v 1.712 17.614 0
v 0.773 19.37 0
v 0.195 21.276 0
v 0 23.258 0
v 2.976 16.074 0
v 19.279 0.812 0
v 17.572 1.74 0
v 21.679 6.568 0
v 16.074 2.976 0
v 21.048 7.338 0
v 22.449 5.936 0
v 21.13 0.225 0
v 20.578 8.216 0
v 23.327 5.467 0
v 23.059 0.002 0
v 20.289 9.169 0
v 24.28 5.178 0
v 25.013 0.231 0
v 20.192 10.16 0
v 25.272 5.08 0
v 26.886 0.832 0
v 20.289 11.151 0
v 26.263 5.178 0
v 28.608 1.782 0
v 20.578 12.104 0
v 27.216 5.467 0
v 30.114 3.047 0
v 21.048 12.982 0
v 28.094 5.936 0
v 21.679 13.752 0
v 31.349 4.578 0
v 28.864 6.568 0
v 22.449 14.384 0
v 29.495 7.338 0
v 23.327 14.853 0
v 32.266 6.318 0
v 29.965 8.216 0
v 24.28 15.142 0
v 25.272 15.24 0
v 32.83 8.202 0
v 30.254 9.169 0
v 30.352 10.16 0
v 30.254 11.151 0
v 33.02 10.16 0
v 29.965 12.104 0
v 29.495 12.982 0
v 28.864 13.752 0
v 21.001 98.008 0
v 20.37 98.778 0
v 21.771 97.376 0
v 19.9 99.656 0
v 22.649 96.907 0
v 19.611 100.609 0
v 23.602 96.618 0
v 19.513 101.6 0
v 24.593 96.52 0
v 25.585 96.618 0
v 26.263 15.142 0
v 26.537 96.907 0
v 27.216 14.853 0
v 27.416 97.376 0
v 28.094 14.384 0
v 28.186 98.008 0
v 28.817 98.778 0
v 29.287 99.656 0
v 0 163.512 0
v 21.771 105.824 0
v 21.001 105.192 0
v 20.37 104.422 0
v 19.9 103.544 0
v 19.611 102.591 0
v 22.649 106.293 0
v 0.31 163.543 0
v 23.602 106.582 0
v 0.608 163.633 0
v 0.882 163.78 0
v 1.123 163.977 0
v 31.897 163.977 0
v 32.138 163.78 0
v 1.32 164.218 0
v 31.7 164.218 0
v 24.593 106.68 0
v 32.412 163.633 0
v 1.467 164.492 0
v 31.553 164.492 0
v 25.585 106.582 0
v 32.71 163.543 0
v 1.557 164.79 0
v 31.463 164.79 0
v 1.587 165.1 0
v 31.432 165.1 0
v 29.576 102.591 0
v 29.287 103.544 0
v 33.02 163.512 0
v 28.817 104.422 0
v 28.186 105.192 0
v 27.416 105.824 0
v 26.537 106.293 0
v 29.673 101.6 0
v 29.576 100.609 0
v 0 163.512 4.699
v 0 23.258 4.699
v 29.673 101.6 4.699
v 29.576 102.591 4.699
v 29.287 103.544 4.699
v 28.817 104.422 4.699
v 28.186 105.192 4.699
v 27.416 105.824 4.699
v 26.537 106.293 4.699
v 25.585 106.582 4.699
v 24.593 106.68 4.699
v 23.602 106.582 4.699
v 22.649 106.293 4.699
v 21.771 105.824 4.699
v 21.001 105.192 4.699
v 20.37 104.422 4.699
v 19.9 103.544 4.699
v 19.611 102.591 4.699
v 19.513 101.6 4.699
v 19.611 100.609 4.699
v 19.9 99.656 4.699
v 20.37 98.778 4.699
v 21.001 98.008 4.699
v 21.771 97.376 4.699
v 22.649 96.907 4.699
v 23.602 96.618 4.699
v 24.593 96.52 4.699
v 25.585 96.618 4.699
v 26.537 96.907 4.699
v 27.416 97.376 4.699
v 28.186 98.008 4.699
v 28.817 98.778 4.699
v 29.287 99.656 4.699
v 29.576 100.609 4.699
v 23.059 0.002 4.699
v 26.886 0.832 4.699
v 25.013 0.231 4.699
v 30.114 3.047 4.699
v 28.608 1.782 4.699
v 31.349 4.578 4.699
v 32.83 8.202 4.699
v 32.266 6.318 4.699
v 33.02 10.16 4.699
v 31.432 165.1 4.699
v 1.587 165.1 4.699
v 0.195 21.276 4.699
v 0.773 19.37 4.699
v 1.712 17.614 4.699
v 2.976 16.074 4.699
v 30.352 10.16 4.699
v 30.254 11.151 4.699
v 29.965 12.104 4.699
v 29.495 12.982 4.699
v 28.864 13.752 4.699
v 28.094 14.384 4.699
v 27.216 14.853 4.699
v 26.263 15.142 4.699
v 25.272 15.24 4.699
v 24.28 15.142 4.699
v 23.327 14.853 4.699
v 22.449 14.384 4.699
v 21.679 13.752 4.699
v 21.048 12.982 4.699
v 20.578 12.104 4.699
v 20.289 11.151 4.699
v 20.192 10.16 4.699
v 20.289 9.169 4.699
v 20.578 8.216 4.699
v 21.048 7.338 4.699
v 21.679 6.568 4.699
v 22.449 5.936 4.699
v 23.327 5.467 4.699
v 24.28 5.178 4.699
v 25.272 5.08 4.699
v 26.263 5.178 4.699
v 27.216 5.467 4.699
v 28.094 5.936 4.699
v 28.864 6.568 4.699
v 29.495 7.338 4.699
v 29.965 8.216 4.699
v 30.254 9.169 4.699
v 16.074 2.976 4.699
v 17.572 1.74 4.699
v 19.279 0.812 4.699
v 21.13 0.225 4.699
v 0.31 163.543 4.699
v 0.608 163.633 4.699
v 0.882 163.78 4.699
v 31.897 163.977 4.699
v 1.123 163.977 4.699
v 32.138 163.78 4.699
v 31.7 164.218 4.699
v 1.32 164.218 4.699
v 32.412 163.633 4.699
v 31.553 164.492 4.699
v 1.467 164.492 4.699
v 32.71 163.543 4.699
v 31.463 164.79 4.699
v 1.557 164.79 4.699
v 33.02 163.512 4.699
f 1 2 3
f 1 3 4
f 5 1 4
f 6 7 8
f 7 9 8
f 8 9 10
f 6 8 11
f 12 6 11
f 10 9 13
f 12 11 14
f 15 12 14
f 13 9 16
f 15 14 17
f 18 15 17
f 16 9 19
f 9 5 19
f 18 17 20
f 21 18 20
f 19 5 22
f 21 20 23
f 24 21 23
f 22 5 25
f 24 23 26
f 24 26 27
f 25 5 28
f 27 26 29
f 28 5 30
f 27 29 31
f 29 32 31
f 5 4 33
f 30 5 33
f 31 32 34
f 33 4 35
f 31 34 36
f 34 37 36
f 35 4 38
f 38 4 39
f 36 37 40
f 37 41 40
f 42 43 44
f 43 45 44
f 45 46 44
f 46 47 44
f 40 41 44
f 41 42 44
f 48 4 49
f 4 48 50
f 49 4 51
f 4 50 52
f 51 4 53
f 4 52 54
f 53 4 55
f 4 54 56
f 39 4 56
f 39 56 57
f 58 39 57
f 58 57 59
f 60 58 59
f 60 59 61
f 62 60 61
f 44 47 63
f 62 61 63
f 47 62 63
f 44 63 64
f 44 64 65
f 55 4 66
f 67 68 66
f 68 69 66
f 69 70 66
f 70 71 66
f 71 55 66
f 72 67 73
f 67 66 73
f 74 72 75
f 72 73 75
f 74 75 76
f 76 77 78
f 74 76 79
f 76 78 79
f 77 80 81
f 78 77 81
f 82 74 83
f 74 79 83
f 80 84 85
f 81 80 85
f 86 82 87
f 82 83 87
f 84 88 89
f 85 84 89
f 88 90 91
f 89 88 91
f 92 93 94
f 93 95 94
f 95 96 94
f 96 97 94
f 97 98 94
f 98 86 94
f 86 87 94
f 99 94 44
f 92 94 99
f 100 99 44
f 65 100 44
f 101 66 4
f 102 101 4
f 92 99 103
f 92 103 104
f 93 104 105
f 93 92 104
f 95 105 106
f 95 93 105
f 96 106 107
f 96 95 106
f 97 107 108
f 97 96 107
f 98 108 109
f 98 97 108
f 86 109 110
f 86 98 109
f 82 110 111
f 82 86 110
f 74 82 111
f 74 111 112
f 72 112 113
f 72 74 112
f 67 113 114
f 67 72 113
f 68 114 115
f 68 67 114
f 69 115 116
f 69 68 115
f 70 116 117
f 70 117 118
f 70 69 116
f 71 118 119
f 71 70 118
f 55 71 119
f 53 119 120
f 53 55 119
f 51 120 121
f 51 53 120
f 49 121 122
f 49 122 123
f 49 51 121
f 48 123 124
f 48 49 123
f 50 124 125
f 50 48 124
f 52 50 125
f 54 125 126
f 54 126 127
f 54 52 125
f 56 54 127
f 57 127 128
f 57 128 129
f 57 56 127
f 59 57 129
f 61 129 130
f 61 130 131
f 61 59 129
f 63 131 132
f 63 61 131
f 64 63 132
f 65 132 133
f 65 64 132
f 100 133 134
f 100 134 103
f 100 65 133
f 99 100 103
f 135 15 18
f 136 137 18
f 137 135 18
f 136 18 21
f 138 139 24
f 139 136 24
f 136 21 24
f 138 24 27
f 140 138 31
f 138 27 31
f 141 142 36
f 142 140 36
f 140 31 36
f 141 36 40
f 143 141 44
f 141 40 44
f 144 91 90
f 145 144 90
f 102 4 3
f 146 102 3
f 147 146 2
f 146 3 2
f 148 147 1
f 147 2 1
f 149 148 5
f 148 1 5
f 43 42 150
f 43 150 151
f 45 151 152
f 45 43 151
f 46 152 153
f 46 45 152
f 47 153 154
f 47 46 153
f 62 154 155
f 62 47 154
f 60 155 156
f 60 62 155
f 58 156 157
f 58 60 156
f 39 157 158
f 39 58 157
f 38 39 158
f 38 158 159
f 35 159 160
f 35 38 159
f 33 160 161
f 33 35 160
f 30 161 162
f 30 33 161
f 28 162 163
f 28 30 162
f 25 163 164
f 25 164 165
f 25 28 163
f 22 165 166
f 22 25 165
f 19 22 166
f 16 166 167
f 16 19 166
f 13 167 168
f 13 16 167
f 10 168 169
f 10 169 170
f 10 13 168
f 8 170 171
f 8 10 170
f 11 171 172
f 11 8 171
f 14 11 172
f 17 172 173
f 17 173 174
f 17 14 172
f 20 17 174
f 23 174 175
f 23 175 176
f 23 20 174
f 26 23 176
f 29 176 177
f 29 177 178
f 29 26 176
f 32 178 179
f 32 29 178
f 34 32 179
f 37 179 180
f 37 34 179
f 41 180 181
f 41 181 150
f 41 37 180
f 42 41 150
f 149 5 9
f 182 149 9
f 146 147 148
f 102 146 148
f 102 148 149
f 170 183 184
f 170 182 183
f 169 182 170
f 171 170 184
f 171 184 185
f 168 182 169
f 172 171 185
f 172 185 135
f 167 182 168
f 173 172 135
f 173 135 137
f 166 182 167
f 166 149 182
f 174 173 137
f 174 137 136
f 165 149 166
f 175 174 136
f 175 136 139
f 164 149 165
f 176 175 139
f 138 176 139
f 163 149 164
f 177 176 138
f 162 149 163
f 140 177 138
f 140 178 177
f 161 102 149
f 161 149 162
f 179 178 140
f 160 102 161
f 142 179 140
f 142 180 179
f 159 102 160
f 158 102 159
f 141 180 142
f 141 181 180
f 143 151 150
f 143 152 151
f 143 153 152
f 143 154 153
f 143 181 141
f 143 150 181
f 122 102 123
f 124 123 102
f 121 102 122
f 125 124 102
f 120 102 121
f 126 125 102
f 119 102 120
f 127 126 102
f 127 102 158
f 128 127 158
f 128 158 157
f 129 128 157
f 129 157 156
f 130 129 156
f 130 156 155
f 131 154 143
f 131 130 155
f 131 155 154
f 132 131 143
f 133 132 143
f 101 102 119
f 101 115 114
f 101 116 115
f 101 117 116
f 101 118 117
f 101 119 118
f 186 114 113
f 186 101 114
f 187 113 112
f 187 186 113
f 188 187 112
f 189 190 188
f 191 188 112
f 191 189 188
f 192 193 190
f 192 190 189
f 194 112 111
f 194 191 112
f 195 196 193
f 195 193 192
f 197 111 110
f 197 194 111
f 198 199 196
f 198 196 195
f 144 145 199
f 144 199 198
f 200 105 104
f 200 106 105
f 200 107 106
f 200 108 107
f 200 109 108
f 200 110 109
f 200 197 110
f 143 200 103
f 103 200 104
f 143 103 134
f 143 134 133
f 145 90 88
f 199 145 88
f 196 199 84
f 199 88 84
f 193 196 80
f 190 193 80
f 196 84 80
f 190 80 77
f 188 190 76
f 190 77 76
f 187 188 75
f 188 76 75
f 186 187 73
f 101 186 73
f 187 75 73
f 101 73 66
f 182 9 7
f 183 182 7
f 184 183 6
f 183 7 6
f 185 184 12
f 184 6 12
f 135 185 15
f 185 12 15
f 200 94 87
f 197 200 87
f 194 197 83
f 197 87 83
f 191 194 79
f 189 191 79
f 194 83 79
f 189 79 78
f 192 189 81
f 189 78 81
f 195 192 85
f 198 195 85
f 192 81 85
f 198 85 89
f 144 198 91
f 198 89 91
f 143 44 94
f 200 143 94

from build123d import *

# Parameters (mm, degrees)
F0_R        = 5.08
F1_DEPTH    = 4.699
F2_T1_DEPTH = 25.7410489686
F2_T3_DEPTH = 55.499


# Not quite as in the source:
# - a fillet or chamfer that OpenCascade refuses, or shapes differently, is made with other operations: its cross-section is extruded or revolved along the edge and cut away or added
# - a feature names something its author has since deleted; it is built from what else it names


with BuildPart() as f1:
    # F0 (on Top) → F1 (new body)
    with BuildSketch(Plane.XY):
        with BuildLine():
            Line((31.4325, 165.1), (1.5875, 165.1))
            ThreePointArc((1.5875, 165.1), (1.1225320151, 163.9774679849), (0, 163.5125))
            Line((0, 163.5125), (0, 19.05))
            Line((0, 19.05), (19.05, 0))
            Line((19.05, 0), (33.02, 0))
            Line((33.02, 0), (33.02, 163.5125))
            ThreePointArc((33.02, 163.5125), (31.8974679849, 163.9774679849), (31.4325, 165.1))
        make_face()
        with Locations((25.2715107054, 10.16)):
            Circle(F0_R, mode=Mode.SUBTRACT)
        with Locations((24.5934482664, 101.6)):
            Circle(F0_R, mode=Mode.SUBTRACT)
    extrude(amount=F1_DEPTH)

    # F2: fillet of radius 10.16 on 3 edges, made by hand

    # F2_s2 → F2_t1 (cut)
    with BuildSketch(Plane.XY.offset(-10.5210244843)):
        with BuildLine():
            ThreePointArc((0, 23.2584097937), (0.7733839497, 19.3703461209), (2.9757951031, 16.0742048969))
            Line((2.9757951031, 16.0742048969), (0, 19.05))
            Line((0, 19.05), (0, 23.2584097937))
        make_face()
        with BuildLine():
            ThreePointArc((16.0742048969, 2.9757951031), (19.3703461209, 0.7733839497), (23.2584097937, 0))
            Line((23.2584097937, 0), (19.05, 0))
            Line((19.05, 0), (16.0742048969, 2.9757951031))
        make_face()
    extrude(amount=F2_T1_DEPTH, mode=Mode.SUBTRACT)

    # F2_s4 → F2_t3 (cut)
    with BuildSketch(Plane.XY.offset(-25.4)):
        with BuildLine():
            ThreePointArc((22.86, 0), (30.0442048969, 2.9757951031), (33.02, 10.16))
            Line((33.02, 10.16), (33.02, 0))
            Line((33.02, 0), (22.86, 0))
        make_face()
    extrude(amount=F2_T3_DEPTH, mode=Mode.SUBTRACT)


solid = f1.part
